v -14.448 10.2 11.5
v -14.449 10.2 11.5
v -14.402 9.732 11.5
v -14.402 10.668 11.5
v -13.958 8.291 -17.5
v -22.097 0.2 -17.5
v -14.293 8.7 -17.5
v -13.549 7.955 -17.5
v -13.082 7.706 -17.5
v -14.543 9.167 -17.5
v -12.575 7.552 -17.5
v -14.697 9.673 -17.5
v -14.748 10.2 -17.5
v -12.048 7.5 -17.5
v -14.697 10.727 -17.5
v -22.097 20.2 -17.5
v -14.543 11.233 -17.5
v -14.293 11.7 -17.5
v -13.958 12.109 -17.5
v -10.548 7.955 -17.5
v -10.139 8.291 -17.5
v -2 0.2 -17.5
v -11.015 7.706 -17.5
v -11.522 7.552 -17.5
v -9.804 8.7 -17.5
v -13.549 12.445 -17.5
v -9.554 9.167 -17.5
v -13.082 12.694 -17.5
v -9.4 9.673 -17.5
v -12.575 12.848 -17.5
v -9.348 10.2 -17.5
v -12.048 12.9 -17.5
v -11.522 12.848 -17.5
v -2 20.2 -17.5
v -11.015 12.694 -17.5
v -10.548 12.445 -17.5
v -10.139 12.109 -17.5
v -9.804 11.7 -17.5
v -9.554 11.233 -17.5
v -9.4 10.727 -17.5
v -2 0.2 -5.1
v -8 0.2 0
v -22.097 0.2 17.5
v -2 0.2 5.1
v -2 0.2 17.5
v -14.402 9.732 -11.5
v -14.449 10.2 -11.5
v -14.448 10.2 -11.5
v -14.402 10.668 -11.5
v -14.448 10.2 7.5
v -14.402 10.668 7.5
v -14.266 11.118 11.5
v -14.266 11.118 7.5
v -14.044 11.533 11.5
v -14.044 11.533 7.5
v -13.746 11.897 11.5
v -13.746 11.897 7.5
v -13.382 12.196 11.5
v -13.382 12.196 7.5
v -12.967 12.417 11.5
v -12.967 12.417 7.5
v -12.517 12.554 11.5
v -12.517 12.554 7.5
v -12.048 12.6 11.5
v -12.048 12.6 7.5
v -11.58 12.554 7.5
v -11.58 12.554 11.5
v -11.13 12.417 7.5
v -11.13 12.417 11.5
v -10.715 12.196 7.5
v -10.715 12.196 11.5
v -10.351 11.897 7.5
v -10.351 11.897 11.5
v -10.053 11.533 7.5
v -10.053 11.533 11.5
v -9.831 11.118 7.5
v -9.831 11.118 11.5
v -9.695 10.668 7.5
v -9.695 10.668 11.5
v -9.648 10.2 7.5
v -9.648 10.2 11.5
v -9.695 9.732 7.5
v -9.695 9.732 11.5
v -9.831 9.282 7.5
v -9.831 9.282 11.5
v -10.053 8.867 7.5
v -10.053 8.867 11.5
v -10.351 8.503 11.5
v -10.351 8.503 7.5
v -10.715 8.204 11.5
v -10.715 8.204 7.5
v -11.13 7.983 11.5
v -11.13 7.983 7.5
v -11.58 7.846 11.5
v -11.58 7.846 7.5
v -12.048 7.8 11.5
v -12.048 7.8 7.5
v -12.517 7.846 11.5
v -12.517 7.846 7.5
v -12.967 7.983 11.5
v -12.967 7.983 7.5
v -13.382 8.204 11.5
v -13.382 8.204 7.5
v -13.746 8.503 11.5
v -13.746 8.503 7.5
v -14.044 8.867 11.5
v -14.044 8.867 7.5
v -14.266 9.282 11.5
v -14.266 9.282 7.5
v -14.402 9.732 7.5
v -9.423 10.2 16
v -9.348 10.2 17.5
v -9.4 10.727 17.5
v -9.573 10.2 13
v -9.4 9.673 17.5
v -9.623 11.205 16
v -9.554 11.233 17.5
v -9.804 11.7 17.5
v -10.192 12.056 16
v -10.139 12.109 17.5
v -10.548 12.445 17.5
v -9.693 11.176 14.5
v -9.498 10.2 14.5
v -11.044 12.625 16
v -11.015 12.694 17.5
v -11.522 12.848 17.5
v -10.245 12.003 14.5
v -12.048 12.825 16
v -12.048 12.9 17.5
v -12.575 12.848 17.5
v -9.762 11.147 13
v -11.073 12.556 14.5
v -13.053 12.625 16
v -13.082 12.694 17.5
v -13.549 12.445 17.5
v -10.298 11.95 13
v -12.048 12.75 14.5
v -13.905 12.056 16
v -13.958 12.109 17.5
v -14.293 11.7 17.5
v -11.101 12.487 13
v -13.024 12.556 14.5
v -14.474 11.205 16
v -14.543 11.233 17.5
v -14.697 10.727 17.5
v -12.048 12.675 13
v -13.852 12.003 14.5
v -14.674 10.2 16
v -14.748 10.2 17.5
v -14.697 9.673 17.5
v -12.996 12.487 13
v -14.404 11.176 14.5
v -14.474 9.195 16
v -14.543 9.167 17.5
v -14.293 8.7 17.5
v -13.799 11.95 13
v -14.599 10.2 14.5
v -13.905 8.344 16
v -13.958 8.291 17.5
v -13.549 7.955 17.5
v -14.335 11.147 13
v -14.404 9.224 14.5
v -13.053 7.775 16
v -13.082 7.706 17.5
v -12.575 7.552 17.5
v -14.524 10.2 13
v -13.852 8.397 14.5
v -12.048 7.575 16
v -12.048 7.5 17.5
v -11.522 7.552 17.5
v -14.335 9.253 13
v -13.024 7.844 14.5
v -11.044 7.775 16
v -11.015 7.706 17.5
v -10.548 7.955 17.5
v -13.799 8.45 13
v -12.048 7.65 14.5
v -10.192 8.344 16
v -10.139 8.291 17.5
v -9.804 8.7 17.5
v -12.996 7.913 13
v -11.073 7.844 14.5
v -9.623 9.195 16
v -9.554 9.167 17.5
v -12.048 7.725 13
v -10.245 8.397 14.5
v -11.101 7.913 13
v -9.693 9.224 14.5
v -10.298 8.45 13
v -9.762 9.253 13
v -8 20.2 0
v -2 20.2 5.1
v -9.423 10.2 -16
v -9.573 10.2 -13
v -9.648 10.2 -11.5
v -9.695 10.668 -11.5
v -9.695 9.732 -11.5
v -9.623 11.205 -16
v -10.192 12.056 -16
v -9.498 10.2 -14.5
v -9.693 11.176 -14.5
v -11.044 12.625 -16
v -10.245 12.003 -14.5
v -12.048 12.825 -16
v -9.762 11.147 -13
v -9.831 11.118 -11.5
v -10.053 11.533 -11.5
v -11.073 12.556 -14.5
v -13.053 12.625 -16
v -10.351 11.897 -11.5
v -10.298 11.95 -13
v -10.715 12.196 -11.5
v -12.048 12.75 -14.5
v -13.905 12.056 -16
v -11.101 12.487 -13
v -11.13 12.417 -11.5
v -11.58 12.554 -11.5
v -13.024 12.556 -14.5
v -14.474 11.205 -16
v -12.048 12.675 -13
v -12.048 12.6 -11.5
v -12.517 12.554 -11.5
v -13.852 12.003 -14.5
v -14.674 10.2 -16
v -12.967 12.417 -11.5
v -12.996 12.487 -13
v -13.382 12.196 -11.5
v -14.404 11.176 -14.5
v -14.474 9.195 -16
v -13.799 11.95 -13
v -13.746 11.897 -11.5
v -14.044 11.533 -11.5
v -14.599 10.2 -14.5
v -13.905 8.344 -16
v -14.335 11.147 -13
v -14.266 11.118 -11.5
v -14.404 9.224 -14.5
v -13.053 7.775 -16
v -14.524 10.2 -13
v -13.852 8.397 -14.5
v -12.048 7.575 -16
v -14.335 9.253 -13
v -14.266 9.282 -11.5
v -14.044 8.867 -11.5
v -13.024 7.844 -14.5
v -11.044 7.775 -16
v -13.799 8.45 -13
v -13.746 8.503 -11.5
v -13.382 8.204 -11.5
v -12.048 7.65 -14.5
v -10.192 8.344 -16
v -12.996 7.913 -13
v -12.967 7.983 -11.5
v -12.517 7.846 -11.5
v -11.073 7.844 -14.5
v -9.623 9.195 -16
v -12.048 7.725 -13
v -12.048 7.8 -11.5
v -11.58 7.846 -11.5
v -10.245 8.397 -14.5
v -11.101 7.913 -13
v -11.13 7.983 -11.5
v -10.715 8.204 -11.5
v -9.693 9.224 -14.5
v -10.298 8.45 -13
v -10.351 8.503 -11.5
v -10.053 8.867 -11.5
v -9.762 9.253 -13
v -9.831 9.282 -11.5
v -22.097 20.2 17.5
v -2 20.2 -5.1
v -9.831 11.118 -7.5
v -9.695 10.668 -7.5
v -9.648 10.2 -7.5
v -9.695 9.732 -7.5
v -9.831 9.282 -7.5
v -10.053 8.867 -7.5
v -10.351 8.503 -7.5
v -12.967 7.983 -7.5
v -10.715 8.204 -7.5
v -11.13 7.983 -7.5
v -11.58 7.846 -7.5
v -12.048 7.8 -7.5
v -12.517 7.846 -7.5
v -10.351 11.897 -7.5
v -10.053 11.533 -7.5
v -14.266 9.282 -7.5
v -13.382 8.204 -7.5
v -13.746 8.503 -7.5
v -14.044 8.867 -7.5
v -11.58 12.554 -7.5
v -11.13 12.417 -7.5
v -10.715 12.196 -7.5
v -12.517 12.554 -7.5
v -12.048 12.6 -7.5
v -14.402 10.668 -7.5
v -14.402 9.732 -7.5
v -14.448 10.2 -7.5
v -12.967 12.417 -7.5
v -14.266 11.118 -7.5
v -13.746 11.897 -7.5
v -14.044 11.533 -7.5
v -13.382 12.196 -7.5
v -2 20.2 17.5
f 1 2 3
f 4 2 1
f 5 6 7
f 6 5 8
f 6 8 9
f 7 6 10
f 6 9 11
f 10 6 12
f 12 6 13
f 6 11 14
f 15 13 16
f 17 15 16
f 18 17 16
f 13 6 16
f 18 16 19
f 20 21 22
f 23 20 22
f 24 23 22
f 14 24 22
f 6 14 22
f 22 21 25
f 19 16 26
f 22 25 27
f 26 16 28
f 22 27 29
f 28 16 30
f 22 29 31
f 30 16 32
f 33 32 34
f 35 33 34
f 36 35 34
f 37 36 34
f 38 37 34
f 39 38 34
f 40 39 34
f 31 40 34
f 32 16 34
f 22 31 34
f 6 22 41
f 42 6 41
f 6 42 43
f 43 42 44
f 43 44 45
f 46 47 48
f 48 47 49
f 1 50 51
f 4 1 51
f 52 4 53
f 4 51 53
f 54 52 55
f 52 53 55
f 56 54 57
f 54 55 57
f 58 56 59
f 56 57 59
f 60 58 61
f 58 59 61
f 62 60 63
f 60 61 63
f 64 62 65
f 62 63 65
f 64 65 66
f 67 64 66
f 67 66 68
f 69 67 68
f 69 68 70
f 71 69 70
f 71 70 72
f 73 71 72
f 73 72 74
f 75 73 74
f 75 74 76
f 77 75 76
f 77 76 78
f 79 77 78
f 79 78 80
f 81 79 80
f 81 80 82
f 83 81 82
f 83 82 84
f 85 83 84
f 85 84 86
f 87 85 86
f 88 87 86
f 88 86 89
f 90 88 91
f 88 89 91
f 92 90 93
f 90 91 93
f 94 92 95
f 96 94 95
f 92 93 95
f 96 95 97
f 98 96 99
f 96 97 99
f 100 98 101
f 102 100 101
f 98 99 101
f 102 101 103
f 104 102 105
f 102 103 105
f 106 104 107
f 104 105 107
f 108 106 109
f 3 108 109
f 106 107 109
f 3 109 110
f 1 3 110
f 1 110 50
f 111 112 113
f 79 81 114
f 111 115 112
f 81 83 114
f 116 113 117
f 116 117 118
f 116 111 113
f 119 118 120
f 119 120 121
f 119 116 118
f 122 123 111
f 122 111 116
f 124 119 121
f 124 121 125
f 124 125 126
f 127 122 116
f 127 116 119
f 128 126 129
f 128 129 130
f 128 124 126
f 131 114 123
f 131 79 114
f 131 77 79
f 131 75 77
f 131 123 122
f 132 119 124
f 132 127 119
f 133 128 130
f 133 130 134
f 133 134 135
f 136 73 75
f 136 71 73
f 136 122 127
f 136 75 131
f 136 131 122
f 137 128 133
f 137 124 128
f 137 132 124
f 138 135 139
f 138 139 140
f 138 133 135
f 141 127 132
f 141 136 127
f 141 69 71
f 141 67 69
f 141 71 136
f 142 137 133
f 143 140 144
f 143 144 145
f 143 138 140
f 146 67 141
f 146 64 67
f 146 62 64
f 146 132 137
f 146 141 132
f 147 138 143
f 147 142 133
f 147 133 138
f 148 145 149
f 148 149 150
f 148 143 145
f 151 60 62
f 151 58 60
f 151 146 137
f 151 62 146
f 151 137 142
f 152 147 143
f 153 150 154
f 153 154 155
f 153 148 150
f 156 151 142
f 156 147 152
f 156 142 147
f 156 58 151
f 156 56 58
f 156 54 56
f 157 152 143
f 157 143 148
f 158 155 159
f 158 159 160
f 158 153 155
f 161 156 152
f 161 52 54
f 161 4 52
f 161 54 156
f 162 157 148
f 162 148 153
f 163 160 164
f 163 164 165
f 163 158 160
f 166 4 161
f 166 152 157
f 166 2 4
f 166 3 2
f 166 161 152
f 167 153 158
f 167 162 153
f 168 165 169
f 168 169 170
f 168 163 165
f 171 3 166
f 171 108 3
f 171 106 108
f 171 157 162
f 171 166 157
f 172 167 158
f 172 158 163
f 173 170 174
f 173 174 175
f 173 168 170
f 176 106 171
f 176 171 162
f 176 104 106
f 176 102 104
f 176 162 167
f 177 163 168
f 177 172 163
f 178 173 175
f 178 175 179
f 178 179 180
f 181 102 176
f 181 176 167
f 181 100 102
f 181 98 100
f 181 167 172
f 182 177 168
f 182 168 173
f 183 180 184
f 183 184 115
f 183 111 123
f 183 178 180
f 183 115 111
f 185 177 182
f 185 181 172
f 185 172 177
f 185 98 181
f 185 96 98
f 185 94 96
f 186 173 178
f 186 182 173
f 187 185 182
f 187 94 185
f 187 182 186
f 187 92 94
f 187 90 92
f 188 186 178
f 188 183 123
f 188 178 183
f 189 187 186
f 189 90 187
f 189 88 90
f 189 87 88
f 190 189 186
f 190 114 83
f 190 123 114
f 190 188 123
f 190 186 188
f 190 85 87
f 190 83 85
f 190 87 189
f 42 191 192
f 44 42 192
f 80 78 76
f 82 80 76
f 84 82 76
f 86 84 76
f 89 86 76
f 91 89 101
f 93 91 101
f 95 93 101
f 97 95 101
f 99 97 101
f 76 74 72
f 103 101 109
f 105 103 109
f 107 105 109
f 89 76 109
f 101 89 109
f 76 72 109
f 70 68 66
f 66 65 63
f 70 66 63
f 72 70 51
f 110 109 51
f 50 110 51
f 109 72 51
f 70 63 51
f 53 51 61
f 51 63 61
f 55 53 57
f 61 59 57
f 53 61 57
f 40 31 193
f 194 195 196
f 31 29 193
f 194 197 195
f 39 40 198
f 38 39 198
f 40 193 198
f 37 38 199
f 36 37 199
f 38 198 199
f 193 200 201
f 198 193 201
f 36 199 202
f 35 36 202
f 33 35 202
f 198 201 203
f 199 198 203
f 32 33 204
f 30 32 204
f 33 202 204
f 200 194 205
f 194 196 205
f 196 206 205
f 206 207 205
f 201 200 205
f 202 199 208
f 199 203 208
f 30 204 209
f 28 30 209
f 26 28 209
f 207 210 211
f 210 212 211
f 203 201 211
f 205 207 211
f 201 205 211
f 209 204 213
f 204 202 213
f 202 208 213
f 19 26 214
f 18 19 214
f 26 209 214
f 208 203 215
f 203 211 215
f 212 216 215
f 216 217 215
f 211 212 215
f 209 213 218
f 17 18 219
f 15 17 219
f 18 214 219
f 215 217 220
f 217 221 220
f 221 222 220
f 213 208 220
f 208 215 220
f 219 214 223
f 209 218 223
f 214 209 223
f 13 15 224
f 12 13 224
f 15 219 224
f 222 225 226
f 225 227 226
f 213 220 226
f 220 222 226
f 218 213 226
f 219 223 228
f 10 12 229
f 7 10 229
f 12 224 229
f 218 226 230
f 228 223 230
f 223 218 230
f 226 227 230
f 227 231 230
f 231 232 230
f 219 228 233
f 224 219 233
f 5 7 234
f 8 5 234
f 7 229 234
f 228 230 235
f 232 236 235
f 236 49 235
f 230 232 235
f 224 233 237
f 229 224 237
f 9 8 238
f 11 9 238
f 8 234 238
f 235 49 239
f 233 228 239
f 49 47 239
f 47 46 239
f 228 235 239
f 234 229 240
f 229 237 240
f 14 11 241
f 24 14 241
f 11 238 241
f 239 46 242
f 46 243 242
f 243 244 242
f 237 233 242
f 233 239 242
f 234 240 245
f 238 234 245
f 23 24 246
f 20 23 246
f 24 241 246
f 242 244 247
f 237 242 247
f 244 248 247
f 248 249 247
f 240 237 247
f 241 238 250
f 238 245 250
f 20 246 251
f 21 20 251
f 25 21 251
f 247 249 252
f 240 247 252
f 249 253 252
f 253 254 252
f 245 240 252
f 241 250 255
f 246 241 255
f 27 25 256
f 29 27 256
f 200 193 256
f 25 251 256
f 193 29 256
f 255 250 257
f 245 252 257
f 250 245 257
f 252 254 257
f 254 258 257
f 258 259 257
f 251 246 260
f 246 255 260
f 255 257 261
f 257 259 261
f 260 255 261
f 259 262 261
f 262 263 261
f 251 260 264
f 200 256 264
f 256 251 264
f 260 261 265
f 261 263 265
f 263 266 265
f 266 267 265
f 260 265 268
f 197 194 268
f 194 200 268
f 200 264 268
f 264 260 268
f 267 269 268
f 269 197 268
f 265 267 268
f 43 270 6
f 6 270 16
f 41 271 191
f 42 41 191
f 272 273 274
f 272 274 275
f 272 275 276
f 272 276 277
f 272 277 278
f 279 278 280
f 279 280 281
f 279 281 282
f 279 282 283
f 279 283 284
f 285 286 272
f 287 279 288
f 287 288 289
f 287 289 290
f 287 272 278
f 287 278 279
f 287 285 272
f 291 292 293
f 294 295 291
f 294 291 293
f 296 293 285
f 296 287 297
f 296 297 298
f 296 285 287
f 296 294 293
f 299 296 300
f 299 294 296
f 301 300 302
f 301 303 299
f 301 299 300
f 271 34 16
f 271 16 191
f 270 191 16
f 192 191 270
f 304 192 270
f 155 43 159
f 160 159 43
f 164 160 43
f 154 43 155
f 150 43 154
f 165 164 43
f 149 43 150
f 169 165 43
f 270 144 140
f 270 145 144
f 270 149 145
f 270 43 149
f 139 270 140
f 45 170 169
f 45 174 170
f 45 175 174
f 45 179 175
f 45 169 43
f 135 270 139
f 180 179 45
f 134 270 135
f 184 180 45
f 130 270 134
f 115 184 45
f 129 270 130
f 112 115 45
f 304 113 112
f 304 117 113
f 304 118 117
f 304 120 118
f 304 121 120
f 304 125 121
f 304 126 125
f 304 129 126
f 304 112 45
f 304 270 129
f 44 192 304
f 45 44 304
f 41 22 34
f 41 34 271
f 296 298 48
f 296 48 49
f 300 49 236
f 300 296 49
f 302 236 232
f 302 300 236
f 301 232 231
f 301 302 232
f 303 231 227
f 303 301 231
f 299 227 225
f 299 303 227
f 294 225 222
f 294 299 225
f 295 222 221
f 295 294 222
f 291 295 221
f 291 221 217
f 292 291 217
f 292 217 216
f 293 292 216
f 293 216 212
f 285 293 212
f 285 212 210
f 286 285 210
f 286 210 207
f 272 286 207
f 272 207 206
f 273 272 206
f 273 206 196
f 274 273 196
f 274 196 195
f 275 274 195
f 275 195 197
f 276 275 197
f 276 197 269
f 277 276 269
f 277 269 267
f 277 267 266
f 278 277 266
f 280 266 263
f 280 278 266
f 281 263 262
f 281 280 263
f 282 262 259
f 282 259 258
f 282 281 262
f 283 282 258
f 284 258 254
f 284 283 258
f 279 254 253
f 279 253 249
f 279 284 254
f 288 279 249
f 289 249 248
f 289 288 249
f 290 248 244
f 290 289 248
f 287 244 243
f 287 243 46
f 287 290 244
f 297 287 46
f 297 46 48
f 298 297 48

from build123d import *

# Parameters (mm, degrees)
BOSS_EXTRUDE1_START       = 0.2
SKETCH2_R                 = 30
BOSS_EXTRUDE1_DEPTH       = 20
CUT_EXTRUDE2_DEPTH        = 47.904157598
SKETCH4_W                 = 60
SKETCH4_H                 = 60
SKETCH4_W_2               = 22.366985862
SKETCH4_H_2               = 35
CUT_EXTRUDE3_DEPTH        = 47.904157598
SKETCH11_W                = 2.27
SKETCH11_H                = 37.5
CUT_EXTRUDE4_DEPTH        = 37.055512755
HOLE1_D                   = 4.8
HOLE1_DEPTH               = 10
HOLE1_CBORE_D             = 5.4
HOLE1_CBORE_DEPTH         = 6
CHAMFER1_SIZE2            = 0.3
CHAMFER1_SIZE             = 6
CHAMFER1_OF_MIRROR1_SIZE2 = 0.3
CHAMFER1_OF_MIRROR1_SIZE  = 6


with BuildPart() as part:
    # Sketch2 → Boss-Extrude1 (new body)
    with BuildSketch(Plane(origin=(0, 0, 0), x_dir=(1, 0, 0), z_dir=(0, 1, 0)).offset(BOSS_EXTRUDE1_START)):
        with Locations(Location((0, 0, 0), (0, 0, 270))):
            Circle(SKETCH2_R)
    extrude(amount=BOSS_EXTRUDE1_DEPTH)

    # Sketch3 → Cut-Extrude2 (cut, through all)
    with BuildSketch(Plane(origin=(0, 20.2, 0), x_dir=(1, 0, 0), z_dir=(0, 1, 0))):
        with BuildLine():
            ThreePointArc((0, -17.5), (17.5, 0), (0, 17.5))
            Line((0, 17.5), (-2, 17.5))
            Line((-2, 17.5), (-2, 9.06190379))
            Line((-2, 9.06190379), (-2, 5.1))
            Line((-2, 5.1), (-8, 0))
            Line((-8, 0), (-2, -5.1))
            Line((-2, -5.1), (-2, -9.06190379))
            Line((-2, -9.06190379), (-2, -17.5))
            Line((-2, -17.5), (0, -17.5))
        make_face()
    extrude(amount=-CUT_EXTRUDE2_DEPTH, mode=Mode.SUBTRACT)

    # Sketch4 → Cut-Extrude3 (cut, through all)
    with BuildSketch(Plane(origin=(0, 20.2, 0), x_dir=(1, 0, 0), z_dir=(0, 1, 0))):
        Rectangle(SKETCH4_W, SKETCH4_H)
        with Locations((-13.183492931, 0)):
            Rectangle(SKETCH4_W_2, SKETCH4_H_2, mode=Mode.SUBTRACT)
    extrude(amount=-CUT_EXTRUDE3_DEPTH, mode=Mode.SUBTRACT)

    # Sketch11 → Cut-Extrude4 (cut, through all)
    with BuildSketch(Plane(origin=(0, 20.2, 0), x_dir=(1, 0, 0), z_dir=(0, 1, 0))):
        with Locations((-23.231985862, -1.25)):
            Rectangle(SKETCH11_W, SKETCH11_H)
    extrude(amount=-CUT_EXTRUDE4_DEPTH, mode=Mode.SUBTRACT)

    # Hole1
    with Locations(Plane.XY.offset(17.5)):
        with Locations((-12.048492931, 10.2)):
            hole1 = CounterBoreHole(HOLE1_D / 2, HOLE1_CBORE_D / 2, HOLE1_CBORE_DEPTH, depth=HOLE1_DEPTH)

    # Chamfer1
    chamfer1_edges = [part.edges().sort_by_distance(p)[0] for p in [
        (-14.748492931, 10.2, 11.5),
    ]]
    chamfer1_side = [part.faces().sort_by_distance(p)[0] for p in [
        (-14.748492931, 10.2, 11.506),
    ]]
    chamfer(chamfer1_edges, length=CHAMFER1_SIZE - 0.0001, length2=CHAMFER1_SIZE2 - 0.0001, reference=chamfer1_side[0])  # a hair under: the kernel refuses the full size

    # Mirror1: Hole1 across plane
    add(hole1.mirror(Plane.XY), mode=Mode.SUBTRACT)

    # Chamfer1 of Mirror1
    chamfer1_of_mirror1_edges = [part.edges().sort_by_distance(p)[0] for p in [
        (-14.748492931, 10.2, -11.5),
    ]]
    chamfer1_of_mirror1_side = [part.faces().sort_by_distance(p)[0] for p in [
        (-14.748492931, 10.2, -11.506),
    ]]
    chamfer(chamfer1_of_mirror1_edges, length=CHAMFER1_OF_MIRROR1_SIZE - 0.0001, length2=CHAMFER1_OF_MIRROR1_SIZE2 - 0.0001, reference=chamfer1_of_mirror1_side[0])  # a hair under: the kernel refuses the full size


solid = part.part
